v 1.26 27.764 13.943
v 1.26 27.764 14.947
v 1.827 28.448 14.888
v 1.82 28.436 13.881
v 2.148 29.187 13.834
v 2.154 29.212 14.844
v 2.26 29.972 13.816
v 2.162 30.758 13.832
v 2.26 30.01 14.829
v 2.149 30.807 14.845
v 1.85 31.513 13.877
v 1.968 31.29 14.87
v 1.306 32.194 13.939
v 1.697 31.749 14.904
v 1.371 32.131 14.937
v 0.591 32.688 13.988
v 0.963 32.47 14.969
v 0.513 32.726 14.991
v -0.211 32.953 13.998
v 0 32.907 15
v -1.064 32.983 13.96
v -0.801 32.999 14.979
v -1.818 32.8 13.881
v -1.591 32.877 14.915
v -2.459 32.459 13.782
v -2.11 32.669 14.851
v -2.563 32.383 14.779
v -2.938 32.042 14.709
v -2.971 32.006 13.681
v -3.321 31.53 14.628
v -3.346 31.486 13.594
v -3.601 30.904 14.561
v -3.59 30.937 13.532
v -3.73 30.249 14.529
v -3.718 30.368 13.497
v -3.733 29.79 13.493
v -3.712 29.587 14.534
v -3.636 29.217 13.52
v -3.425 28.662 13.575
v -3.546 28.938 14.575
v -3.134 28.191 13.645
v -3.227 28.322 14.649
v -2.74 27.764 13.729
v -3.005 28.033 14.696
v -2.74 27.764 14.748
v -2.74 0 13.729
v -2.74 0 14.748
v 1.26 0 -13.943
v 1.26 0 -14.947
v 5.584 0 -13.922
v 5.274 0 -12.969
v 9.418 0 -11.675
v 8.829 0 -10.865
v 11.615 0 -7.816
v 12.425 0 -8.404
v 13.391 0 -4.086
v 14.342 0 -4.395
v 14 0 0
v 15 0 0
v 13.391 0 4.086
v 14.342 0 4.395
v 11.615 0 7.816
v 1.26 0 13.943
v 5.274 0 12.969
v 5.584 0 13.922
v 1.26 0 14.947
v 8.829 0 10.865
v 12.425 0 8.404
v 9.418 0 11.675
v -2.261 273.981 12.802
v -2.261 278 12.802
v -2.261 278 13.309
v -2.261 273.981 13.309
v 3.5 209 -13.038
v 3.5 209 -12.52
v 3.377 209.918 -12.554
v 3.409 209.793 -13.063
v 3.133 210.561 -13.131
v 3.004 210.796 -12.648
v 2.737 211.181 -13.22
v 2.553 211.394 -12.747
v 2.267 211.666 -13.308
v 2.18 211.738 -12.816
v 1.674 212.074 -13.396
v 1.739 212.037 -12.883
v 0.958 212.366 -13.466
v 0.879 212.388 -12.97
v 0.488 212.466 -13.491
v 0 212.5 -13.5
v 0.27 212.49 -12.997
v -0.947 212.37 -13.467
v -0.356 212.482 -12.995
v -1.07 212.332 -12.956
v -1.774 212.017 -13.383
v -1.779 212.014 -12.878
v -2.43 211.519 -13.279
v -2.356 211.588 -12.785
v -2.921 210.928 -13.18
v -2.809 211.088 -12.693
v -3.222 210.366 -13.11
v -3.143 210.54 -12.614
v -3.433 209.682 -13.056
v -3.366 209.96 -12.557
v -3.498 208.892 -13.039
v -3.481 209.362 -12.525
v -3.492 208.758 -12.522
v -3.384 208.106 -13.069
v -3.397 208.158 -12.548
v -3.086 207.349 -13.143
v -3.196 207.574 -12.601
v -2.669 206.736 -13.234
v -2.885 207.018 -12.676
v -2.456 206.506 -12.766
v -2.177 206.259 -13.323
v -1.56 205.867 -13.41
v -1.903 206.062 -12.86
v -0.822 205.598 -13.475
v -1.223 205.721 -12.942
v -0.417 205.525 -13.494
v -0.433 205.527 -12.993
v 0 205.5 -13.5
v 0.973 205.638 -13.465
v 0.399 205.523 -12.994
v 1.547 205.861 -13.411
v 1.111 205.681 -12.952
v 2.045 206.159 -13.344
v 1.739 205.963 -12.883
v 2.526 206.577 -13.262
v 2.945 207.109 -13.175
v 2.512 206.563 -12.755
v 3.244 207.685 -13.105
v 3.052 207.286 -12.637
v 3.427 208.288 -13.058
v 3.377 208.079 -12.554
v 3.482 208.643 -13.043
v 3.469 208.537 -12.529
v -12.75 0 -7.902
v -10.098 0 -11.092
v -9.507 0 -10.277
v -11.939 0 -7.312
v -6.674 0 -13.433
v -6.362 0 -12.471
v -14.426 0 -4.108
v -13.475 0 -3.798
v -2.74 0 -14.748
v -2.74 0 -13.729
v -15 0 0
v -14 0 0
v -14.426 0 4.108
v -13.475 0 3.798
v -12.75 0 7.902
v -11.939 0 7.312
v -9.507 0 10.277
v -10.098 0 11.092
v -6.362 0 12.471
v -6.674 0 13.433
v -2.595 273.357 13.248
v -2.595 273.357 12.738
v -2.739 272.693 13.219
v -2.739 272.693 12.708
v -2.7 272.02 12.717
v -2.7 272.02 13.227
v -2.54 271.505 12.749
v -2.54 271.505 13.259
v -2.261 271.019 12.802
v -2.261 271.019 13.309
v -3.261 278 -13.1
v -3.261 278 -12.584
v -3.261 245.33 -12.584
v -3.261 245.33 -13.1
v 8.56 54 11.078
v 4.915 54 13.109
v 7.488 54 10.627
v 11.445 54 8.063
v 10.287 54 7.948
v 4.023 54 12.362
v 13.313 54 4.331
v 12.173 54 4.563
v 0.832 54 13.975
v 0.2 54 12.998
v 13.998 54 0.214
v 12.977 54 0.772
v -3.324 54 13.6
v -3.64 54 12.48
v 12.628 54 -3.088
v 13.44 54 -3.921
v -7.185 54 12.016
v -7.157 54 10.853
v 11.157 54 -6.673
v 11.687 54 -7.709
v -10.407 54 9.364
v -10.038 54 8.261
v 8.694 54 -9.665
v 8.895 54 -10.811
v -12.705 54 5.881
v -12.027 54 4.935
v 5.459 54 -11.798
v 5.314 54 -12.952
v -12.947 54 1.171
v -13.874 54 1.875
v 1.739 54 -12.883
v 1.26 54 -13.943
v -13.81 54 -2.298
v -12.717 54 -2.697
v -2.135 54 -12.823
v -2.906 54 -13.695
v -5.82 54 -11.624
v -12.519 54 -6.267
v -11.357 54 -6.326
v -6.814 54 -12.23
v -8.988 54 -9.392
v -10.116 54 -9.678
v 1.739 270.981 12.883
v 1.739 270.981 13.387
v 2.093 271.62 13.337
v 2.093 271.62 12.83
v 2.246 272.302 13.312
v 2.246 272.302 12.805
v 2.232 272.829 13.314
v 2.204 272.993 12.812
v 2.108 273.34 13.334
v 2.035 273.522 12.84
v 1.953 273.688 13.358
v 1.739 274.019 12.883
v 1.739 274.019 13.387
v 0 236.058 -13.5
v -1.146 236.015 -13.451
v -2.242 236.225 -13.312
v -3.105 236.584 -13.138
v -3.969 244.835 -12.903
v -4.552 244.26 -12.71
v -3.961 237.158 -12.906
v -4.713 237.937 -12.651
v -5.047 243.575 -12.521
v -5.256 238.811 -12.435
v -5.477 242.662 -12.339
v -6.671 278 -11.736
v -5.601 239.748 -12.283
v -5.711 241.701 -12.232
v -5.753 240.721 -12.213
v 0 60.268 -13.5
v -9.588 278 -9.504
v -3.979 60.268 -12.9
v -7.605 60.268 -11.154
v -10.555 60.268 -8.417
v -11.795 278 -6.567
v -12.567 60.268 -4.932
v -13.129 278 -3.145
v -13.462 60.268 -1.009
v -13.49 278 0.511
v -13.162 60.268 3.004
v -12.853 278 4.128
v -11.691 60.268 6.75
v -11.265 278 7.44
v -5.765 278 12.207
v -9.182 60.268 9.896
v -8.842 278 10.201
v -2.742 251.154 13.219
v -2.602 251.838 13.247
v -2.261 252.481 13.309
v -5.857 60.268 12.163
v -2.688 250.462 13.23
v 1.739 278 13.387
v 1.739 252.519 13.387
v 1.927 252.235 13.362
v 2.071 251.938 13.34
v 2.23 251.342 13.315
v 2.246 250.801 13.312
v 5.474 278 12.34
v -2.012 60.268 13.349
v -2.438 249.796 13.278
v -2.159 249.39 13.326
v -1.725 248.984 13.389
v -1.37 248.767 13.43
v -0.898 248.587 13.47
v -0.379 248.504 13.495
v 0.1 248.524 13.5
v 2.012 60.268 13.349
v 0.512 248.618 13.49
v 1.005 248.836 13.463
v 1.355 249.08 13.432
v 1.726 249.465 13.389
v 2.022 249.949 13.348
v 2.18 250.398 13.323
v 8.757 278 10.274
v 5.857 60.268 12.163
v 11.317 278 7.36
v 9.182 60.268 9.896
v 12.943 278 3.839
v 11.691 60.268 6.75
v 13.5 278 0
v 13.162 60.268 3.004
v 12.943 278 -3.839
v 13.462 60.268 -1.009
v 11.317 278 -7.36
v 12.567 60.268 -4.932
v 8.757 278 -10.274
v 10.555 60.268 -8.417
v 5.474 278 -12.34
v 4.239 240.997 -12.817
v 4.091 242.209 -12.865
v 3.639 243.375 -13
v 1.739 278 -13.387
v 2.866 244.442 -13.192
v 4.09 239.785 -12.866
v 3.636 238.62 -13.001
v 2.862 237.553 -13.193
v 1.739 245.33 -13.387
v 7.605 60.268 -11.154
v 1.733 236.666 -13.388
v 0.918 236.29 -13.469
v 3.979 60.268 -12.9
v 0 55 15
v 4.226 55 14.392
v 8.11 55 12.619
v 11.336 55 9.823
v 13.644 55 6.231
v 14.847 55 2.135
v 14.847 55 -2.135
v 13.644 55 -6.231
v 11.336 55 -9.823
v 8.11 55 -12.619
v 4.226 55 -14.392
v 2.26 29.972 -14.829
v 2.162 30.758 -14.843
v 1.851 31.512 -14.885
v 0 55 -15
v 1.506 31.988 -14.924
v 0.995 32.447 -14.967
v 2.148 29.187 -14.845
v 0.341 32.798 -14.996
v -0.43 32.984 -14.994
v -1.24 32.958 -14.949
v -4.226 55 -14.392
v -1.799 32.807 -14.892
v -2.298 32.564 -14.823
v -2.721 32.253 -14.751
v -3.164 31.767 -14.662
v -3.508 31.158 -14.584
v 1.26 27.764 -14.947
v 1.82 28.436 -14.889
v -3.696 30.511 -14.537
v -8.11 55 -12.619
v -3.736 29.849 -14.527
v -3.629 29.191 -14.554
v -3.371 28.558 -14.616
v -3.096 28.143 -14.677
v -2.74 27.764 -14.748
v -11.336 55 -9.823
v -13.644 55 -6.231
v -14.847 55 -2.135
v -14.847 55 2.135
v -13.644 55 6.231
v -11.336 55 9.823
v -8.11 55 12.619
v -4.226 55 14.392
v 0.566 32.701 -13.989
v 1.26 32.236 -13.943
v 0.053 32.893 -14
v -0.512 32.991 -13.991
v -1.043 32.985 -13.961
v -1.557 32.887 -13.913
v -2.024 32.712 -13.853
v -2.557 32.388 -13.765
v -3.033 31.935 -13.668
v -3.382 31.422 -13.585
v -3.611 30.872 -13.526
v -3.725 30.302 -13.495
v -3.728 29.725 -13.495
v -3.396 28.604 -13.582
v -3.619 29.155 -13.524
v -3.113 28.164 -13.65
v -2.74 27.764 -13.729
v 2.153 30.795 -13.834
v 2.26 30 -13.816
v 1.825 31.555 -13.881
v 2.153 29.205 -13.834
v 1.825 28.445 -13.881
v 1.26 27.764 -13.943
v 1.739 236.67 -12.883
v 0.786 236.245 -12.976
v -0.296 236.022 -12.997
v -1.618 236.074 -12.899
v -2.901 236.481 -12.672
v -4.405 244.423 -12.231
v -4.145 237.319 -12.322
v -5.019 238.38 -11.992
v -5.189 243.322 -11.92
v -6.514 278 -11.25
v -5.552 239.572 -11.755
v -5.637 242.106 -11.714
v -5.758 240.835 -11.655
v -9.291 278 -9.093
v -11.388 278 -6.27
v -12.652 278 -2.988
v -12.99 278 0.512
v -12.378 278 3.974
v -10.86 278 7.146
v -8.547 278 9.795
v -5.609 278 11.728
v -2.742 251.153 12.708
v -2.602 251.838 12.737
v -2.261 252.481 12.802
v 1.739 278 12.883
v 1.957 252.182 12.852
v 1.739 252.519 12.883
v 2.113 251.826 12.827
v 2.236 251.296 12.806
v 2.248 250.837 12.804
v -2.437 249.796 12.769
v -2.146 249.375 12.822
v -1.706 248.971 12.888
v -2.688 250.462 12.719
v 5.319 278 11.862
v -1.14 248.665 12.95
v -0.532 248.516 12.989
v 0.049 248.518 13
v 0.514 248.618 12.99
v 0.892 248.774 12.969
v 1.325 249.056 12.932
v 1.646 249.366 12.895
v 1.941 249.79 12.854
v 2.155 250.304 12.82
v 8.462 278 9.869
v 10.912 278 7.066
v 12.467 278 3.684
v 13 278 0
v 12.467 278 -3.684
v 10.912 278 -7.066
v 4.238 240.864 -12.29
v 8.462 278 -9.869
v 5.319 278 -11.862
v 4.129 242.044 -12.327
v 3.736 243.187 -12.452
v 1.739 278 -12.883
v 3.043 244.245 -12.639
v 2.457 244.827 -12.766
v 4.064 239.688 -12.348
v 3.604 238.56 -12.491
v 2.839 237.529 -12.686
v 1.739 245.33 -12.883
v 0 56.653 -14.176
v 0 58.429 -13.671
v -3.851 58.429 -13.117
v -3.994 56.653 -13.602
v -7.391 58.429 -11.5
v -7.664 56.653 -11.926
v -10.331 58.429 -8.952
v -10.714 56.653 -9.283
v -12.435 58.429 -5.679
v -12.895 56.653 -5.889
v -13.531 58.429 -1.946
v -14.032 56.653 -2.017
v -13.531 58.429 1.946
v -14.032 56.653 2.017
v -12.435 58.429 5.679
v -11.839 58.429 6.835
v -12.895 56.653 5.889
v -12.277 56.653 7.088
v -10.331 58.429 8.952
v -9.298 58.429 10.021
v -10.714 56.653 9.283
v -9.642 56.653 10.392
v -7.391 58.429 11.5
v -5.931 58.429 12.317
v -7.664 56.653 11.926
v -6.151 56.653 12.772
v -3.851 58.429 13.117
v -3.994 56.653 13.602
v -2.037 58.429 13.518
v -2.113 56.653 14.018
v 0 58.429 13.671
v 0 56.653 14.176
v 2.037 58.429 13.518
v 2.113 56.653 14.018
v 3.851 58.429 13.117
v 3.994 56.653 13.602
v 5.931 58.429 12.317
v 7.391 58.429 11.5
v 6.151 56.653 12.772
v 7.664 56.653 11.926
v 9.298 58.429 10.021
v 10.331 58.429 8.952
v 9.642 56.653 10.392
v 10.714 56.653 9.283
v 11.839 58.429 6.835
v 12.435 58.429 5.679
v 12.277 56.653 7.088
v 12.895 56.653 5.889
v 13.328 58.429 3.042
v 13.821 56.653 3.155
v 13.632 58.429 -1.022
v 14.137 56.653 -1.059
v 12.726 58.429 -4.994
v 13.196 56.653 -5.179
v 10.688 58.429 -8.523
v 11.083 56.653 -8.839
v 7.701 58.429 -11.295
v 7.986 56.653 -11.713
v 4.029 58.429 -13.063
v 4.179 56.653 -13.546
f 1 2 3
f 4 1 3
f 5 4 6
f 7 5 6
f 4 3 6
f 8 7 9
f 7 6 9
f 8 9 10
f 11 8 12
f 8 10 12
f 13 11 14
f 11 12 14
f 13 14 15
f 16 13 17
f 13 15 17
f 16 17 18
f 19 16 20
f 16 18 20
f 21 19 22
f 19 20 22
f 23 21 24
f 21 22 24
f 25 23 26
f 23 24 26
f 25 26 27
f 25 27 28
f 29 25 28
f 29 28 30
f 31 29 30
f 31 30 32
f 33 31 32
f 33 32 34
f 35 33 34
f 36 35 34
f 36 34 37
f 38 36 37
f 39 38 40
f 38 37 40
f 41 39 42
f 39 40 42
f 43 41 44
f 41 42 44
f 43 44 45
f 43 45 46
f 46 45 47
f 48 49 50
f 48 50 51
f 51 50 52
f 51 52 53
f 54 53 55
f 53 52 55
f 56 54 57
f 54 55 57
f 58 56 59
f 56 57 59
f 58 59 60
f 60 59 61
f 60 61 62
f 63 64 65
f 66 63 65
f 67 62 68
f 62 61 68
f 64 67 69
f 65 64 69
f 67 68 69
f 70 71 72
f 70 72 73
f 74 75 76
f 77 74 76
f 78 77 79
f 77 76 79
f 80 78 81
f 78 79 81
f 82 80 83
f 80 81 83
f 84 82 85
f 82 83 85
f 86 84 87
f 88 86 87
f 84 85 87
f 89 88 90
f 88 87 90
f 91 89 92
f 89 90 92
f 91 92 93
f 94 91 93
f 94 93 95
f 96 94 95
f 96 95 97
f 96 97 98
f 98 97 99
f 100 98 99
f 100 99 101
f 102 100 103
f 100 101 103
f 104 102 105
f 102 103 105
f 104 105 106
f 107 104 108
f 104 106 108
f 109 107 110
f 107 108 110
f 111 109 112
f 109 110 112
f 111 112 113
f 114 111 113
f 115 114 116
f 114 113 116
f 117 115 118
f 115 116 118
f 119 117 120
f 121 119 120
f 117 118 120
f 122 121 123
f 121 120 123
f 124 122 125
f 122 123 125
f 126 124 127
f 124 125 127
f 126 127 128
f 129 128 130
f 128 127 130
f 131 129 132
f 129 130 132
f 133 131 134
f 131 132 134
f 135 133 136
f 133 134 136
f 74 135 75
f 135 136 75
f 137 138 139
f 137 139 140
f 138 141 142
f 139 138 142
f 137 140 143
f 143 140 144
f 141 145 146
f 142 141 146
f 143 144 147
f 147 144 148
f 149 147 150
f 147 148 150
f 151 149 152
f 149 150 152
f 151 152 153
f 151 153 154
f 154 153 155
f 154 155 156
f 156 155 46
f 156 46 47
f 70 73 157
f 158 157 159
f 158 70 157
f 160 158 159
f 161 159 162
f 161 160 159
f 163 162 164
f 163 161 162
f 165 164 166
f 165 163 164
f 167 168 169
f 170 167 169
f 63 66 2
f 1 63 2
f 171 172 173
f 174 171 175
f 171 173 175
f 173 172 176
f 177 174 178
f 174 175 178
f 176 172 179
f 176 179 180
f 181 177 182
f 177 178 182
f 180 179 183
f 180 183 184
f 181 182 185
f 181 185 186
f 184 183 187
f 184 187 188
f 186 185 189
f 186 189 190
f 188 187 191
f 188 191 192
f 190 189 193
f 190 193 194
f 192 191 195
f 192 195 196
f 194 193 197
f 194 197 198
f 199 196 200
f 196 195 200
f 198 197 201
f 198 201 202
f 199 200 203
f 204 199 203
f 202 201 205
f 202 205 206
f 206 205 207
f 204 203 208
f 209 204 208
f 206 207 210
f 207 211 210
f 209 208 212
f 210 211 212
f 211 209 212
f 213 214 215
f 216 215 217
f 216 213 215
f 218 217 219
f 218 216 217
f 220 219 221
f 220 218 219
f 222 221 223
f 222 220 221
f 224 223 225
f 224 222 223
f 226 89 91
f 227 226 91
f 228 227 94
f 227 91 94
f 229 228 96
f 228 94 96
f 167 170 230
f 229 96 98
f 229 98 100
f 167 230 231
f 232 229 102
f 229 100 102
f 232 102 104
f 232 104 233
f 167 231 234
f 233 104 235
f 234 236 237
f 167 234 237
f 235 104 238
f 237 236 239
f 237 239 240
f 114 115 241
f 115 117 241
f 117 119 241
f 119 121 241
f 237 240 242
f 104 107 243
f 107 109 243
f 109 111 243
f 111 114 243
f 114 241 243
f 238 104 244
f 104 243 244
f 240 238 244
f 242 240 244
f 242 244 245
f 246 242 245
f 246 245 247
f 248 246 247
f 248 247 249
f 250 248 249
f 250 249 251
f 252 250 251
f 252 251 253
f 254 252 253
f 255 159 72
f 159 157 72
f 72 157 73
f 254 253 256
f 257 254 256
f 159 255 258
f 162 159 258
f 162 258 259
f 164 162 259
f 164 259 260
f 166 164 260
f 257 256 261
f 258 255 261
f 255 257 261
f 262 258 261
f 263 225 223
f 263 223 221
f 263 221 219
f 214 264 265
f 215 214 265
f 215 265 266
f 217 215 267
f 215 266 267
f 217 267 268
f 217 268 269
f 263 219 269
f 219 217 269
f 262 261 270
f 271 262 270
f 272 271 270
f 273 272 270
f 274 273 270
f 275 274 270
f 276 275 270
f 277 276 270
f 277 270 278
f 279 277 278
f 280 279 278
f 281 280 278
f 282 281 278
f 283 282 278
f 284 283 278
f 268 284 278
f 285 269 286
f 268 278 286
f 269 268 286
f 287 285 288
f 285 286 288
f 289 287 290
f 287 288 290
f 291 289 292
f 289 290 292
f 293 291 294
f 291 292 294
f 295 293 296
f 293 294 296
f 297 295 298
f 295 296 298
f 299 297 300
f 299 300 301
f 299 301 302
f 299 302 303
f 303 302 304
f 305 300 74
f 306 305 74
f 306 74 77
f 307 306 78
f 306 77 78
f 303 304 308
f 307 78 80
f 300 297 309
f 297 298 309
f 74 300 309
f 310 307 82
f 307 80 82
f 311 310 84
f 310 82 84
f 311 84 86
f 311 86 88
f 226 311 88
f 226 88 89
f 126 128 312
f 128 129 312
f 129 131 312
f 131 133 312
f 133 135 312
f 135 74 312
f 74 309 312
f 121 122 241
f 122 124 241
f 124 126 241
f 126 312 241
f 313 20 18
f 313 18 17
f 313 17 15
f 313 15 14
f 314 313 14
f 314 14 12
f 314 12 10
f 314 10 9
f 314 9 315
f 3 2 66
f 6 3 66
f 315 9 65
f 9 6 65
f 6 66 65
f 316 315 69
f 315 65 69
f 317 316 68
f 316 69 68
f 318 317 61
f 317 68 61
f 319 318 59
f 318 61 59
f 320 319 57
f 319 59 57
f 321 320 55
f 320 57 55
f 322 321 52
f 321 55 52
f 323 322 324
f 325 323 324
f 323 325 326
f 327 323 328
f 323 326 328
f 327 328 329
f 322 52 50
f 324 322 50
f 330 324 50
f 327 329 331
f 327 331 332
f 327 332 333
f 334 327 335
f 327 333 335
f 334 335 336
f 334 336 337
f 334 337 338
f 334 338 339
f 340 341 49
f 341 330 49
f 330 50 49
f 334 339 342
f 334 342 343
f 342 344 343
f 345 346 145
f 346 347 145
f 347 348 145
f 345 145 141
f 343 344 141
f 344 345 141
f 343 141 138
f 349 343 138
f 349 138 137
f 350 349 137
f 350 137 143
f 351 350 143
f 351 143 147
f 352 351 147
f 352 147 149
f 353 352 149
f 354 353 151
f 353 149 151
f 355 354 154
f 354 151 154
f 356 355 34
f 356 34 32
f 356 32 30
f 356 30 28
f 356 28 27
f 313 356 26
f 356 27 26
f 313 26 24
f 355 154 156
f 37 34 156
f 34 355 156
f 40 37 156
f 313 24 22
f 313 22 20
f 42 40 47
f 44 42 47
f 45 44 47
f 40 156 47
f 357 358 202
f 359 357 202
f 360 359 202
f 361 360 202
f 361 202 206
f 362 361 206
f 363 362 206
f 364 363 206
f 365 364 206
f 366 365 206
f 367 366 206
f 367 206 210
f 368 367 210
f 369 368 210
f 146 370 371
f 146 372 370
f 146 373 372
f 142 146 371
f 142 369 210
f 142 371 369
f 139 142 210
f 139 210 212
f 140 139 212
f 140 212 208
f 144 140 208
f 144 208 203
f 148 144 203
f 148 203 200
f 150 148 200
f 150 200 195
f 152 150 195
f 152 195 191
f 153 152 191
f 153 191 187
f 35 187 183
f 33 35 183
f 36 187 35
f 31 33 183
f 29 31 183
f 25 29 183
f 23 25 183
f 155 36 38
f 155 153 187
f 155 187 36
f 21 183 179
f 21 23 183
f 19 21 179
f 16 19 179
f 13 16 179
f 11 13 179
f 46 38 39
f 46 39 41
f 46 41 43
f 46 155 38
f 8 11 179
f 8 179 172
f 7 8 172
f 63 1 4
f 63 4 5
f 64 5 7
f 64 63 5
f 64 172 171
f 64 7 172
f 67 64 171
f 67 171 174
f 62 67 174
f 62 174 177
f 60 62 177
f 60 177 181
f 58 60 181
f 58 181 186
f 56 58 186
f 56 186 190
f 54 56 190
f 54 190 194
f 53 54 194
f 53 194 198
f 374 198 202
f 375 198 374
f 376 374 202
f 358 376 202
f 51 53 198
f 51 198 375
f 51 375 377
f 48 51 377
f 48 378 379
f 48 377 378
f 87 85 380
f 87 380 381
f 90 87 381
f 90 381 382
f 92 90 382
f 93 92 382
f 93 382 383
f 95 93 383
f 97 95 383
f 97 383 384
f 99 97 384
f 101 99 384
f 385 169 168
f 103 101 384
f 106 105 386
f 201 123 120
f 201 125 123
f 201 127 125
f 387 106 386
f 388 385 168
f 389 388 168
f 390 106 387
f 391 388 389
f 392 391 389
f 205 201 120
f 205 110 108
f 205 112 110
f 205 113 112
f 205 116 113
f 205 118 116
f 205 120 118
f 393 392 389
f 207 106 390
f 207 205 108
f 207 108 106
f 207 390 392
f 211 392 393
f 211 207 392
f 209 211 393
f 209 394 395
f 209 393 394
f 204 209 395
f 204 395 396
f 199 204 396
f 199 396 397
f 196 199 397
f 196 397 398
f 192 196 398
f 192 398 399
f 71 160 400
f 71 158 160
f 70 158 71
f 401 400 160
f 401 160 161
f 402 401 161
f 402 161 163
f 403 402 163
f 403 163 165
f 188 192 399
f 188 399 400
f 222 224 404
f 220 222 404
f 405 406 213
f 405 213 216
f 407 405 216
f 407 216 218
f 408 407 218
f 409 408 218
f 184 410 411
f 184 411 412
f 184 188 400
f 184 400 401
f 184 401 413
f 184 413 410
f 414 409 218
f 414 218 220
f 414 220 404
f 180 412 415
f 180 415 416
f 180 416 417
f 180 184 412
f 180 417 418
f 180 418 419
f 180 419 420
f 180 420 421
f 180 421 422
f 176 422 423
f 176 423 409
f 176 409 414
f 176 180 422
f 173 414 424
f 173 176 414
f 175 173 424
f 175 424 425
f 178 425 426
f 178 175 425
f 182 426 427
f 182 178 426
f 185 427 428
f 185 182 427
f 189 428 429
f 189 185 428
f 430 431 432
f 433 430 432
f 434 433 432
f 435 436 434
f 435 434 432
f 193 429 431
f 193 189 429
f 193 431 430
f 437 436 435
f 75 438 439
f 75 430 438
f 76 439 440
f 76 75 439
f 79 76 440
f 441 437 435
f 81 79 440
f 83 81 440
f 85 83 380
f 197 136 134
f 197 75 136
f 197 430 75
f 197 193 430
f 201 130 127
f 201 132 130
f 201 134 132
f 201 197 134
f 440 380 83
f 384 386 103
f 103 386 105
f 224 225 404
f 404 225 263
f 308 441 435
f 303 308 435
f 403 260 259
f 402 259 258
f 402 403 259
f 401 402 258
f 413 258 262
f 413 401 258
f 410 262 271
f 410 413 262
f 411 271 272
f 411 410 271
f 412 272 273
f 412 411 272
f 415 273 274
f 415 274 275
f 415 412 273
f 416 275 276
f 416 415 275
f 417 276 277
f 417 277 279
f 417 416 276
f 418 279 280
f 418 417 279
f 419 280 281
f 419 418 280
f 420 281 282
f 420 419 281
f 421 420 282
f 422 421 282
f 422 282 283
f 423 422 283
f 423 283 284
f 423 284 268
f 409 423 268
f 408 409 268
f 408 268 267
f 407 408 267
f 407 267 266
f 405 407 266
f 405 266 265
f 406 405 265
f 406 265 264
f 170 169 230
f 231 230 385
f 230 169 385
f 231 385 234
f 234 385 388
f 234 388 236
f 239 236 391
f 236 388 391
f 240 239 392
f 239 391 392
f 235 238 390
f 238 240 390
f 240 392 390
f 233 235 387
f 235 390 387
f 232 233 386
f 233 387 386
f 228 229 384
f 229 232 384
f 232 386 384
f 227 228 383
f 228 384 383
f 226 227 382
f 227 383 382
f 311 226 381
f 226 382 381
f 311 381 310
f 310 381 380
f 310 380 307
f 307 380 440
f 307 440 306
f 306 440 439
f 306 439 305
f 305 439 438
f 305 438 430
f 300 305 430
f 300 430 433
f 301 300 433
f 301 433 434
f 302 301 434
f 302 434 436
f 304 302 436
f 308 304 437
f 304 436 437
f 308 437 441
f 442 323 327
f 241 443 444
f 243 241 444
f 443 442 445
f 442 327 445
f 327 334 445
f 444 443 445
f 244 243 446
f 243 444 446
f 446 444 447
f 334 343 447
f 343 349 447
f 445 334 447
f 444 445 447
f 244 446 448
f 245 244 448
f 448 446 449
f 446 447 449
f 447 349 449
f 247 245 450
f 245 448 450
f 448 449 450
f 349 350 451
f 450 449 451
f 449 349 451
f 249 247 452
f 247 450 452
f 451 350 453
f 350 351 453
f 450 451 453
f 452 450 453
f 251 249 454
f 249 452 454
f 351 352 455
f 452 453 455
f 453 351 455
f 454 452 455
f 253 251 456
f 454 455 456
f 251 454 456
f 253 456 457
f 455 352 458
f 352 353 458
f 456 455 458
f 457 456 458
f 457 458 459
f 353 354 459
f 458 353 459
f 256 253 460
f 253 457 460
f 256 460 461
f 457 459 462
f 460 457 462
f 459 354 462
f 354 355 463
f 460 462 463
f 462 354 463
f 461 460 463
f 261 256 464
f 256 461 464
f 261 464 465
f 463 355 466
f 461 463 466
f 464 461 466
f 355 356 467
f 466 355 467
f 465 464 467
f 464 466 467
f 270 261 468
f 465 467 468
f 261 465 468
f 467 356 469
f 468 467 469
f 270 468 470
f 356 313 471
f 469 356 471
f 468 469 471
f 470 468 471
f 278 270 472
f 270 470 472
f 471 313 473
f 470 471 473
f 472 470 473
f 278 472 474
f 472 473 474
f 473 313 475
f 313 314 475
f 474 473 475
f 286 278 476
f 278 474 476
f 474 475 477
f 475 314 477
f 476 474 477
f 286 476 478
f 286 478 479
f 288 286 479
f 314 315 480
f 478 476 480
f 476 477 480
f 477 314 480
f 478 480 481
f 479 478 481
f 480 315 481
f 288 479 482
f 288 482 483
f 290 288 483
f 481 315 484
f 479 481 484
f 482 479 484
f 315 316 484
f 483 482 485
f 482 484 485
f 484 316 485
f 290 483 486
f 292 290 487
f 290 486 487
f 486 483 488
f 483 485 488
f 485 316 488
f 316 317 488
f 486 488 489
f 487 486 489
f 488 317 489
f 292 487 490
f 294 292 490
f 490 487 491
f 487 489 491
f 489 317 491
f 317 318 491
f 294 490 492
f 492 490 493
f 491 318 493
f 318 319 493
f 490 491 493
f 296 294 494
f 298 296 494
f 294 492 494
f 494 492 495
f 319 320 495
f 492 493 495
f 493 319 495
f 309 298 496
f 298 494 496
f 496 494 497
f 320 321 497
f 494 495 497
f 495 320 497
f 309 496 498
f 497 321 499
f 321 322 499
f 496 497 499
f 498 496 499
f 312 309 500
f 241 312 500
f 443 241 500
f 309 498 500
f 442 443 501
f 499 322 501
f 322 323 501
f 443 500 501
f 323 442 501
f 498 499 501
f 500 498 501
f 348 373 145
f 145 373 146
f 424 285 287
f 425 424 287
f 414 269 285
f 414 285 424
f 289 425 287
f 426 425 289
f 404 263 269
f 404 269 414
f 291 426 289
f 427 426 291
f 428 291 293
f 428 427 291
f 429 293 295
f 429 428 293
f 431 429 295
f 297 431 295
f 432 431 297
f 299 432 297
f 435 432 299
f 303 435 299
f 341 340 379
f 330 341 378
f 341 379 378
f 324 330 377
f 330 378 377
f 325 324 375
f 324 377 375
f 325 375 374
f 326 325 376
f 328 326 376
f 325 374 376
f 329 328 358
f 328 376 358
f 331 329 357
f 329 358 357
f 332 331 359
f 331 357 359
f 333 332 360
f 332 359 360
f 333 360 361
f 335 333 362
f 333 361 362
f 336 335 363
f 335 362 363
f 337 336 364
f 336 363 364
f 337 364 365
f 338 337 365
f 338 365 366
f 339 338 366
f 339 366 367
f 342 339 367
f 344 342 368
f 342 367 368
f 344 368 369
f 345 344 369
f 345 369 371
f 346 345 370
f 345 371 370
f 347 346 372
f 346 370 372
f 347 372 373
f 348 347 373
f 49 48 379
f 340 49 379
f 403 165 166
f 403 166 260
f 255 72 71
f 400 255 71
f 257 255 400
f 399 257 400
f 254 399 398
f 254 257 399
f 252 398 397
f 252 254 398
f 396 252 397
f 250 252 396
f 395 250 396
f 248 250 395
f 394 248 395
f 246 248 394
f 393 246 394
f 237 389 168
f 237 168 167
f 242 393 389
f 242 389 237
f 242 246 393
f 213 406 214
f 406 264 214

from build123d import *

# Parameters (mm, degrees)
CROQUIS2_R                 = 15
SALIENTE_EXTRUIR2_DEPTH    = 55
CORTAR_EXTRUIR1_DEPTH      = 27.5
CROQUIS6_R                 = 14
CORTAR_EXTRUIR3_DEPTH      = 54
CROQUIS7_R                 = 13.5
SALIENTE_EXTRUIR4_DEPTH    = 223
CORTAR_EXTRUIR5_REACH      = 280.808
CORTAR_EXTRUIR5_END_RADIUS = 13.5
CROQUIS9_R                 = 3.5
CORTAR_EXTRUIR6_DEPTH      = 23
CORTAR_EXTRUIR7_DEPTH      = 23
CROQUIS11_R                = 13
CORTAR_EXTRUIR8_DEPTH      = 291
REDONDEO1_R                = 10


with BuildPart() as part:
    # Croquis2 → Saliente-Extruir2 (new body)
    with BuildSketch(Plane(origin=(0, 0, 0), x_dir=(1, 0, 0), z_dir=(0, 1, 0))):
        with Locations(Location((0, 0, 0), (0, 0, 270))):
            Circle(CROQUIS2_R)
    extrude(amount=SALIENTE_EXTRUIR2_DEPTH)

    # Croquis3 → Cortar-Extruir1 (cut, symmetric)
    with BuildSketch(Plane.XY):
        with BuildLine():
            Line((-2.74026183, 0), (1.25973817, 0))
            Line((1.25973817, 0), (1.25973817, 27.763932023))
            ThreePointArc((1.25973817, 27.763932023), (-0.74026183, 33), (-2.74026183, 27.763932023))
            Line((-2.74026183, 27.763932023), (-2.74026183, 0))
        make_face()
    extrude(amount=CORTAR_EXTRUIR1_DEPTH, both=True, mode=Mode.SUBTRACT)

    # Croquis6 → Cortar-Extruir3 (cut)
    with BuildSketch(Plane(origin=(0, 0, 0), x_dir=(1, 0, 0), z_dir=(0, 1, 0))):
        with Locations(Location((0, 0, 0), (0, 0, 84.83746883))):
            Circle(CROQUIS6_R)
    extrude(amount=CORTAR_EXTRUIR3_DEPTH, mode=Mode.SUBTRACT)

    # Croquis7 → Saliente-Extruir4 (add)
    with BuildSketch(Plane(origin=(0, 55, 0), x_dir=(1, 0, 0), z_dir=(0, 1, 0))):
        with Locations(Location((0, 0, 0), (0, 0, 90))):
            Circle(CROQUIS7_R)
    extrude(amount=SALIENTE_EXTRUIR4_DEPTH)

    # Cortar-Extruir5: up to this cylinder (the profile starts inside it)
    cortar_extruir5_end = Plane(origin=(0, 255.043672, 0), z_dir=(0, -1, 0)) * Cylinder(CORTAR_EXTRUIR5_END_RADIUS, 589.616, mode=Mode.PRIVATE)
    # Croquis8 → Cortar-Extruir5 (cut, up to the surface)
    with BuildSketch(Plane.XY, mode=Mode.PRIVATE) as cortar_extruir5_sk1:
        with BuildLine():
            Line((1.73935776, 278), (-3.26064224, 278))
            Line((-3.26064224, 278), (-3.26064224, 245.330127019))
            ThreePointArc((-3.26064224, 245.330127019), (-0.76064224, 236), (1.73935776, 245.330127019))
            Line((1.73935776, 245.330127019), (1.73935776, 278))
        make_face()
    cortar_extruir5_tool1 = extrude(cortar_extruir5_sk1.sketch, amount=-CORTAR_EXTRUIR5_REACH, mode=Mode.PRIVATE) & cortar_extruir5_end
    add(cortar_extruir5_tool1.solids().sort_by_distance((-0.760642, 255.043672, 0))[0], mode=Mode.SUBTRACT)

    # Croquis9 → Cortar-Extruir6 (cut)
    with BuildSketch(Plane.XY):
        with Locations((0, 209)):
            Circle(CROQUIS9_R)
    extrude(amount=-CORTAR_EXTRUIR6_DEPTH, mode=Mode.SUBTRACT)

    # Croquis10 → Cortar-Extruir7 (cut)
    with BuildSketch(Plane(origin=(0, 0, 0), x_dir=(-1, 0, 0), z_dir=(0, 0, -1))):
        with BuildLine():
            Line((2.26064224, 271.01908507), (2.26064224, 252.48091493))
            ThreePointArc((2.26064224, 252.48091493), (0.22284696, 248.500111609), (-1.73935776, 252.518713023))
            Line((-1.73935776, 252.518713023), (-1.73935776, 270.981286977))
            ThreePointArc((-1.73935776, 270.981286977), (-2.253530287, 272.5), (-1.73935776, 274.018713023))
            Line((-1.73935776, 274.018713023), (-1.73935776, 278))
            Line((-1.73935776, 278), (2.26064224, 278))
            Line((2.26064224, 278), (2.26064224, 273.98091493))
            ThreePointArc((2.26064224, 273.98091493), (2.746469713, 272.5), (2.26064224, 271.01908507))
        make_face()
    extrude(amount=-CORTAR_EXTRUIR7_DEPTH, mode=Mode.SUBTRACT)

    # Croquis11 → Cortar-Extruir8 (cut)
    with BuildSketch(Plane(origin=(0, 0, 0), x_dir=(1, 0, 0), z_dir=(0, 1, 0))):
        with Locations(Location((0, 0, 0), (0, 0, 82.310952423))):
            Circle(CROQUIS11_R)
    extrude(amount=CORTAR_EXTRUIR8_DEPTH, mode=Mode.SUBTRACT)

    # Redondeo1
    # the kernel refuses this fillet: 10 mm, written as the material it adds along each edge
    with BuildSketch(Plane(origin=(0, 55, 0), x_dir=(0, 0, -1), z_dir=(1, 0, 0))) as redondeo1_piece_1:
        with BuildLine():
            CenterArc((23.5, 5.267826876), REDONDEO1_R, 180, 31.788330617)
            Line((13.5, 5.267826876), (13.3, 5.267826876))
            Line((13.3, 5.267826876), (13.3, 0))
            Line((13.3, 0), (13.5, -0.2))
            ThreePointArc((13.5, -0.2), (14.25, -0.2), (14.83, -0.105356538))
            Line((14.83, -0.105356538), (15, 0))
        make_face()
    revolve(axis=Axis((0, 55, 0), (0, 1, 0)))


solid = part.part
